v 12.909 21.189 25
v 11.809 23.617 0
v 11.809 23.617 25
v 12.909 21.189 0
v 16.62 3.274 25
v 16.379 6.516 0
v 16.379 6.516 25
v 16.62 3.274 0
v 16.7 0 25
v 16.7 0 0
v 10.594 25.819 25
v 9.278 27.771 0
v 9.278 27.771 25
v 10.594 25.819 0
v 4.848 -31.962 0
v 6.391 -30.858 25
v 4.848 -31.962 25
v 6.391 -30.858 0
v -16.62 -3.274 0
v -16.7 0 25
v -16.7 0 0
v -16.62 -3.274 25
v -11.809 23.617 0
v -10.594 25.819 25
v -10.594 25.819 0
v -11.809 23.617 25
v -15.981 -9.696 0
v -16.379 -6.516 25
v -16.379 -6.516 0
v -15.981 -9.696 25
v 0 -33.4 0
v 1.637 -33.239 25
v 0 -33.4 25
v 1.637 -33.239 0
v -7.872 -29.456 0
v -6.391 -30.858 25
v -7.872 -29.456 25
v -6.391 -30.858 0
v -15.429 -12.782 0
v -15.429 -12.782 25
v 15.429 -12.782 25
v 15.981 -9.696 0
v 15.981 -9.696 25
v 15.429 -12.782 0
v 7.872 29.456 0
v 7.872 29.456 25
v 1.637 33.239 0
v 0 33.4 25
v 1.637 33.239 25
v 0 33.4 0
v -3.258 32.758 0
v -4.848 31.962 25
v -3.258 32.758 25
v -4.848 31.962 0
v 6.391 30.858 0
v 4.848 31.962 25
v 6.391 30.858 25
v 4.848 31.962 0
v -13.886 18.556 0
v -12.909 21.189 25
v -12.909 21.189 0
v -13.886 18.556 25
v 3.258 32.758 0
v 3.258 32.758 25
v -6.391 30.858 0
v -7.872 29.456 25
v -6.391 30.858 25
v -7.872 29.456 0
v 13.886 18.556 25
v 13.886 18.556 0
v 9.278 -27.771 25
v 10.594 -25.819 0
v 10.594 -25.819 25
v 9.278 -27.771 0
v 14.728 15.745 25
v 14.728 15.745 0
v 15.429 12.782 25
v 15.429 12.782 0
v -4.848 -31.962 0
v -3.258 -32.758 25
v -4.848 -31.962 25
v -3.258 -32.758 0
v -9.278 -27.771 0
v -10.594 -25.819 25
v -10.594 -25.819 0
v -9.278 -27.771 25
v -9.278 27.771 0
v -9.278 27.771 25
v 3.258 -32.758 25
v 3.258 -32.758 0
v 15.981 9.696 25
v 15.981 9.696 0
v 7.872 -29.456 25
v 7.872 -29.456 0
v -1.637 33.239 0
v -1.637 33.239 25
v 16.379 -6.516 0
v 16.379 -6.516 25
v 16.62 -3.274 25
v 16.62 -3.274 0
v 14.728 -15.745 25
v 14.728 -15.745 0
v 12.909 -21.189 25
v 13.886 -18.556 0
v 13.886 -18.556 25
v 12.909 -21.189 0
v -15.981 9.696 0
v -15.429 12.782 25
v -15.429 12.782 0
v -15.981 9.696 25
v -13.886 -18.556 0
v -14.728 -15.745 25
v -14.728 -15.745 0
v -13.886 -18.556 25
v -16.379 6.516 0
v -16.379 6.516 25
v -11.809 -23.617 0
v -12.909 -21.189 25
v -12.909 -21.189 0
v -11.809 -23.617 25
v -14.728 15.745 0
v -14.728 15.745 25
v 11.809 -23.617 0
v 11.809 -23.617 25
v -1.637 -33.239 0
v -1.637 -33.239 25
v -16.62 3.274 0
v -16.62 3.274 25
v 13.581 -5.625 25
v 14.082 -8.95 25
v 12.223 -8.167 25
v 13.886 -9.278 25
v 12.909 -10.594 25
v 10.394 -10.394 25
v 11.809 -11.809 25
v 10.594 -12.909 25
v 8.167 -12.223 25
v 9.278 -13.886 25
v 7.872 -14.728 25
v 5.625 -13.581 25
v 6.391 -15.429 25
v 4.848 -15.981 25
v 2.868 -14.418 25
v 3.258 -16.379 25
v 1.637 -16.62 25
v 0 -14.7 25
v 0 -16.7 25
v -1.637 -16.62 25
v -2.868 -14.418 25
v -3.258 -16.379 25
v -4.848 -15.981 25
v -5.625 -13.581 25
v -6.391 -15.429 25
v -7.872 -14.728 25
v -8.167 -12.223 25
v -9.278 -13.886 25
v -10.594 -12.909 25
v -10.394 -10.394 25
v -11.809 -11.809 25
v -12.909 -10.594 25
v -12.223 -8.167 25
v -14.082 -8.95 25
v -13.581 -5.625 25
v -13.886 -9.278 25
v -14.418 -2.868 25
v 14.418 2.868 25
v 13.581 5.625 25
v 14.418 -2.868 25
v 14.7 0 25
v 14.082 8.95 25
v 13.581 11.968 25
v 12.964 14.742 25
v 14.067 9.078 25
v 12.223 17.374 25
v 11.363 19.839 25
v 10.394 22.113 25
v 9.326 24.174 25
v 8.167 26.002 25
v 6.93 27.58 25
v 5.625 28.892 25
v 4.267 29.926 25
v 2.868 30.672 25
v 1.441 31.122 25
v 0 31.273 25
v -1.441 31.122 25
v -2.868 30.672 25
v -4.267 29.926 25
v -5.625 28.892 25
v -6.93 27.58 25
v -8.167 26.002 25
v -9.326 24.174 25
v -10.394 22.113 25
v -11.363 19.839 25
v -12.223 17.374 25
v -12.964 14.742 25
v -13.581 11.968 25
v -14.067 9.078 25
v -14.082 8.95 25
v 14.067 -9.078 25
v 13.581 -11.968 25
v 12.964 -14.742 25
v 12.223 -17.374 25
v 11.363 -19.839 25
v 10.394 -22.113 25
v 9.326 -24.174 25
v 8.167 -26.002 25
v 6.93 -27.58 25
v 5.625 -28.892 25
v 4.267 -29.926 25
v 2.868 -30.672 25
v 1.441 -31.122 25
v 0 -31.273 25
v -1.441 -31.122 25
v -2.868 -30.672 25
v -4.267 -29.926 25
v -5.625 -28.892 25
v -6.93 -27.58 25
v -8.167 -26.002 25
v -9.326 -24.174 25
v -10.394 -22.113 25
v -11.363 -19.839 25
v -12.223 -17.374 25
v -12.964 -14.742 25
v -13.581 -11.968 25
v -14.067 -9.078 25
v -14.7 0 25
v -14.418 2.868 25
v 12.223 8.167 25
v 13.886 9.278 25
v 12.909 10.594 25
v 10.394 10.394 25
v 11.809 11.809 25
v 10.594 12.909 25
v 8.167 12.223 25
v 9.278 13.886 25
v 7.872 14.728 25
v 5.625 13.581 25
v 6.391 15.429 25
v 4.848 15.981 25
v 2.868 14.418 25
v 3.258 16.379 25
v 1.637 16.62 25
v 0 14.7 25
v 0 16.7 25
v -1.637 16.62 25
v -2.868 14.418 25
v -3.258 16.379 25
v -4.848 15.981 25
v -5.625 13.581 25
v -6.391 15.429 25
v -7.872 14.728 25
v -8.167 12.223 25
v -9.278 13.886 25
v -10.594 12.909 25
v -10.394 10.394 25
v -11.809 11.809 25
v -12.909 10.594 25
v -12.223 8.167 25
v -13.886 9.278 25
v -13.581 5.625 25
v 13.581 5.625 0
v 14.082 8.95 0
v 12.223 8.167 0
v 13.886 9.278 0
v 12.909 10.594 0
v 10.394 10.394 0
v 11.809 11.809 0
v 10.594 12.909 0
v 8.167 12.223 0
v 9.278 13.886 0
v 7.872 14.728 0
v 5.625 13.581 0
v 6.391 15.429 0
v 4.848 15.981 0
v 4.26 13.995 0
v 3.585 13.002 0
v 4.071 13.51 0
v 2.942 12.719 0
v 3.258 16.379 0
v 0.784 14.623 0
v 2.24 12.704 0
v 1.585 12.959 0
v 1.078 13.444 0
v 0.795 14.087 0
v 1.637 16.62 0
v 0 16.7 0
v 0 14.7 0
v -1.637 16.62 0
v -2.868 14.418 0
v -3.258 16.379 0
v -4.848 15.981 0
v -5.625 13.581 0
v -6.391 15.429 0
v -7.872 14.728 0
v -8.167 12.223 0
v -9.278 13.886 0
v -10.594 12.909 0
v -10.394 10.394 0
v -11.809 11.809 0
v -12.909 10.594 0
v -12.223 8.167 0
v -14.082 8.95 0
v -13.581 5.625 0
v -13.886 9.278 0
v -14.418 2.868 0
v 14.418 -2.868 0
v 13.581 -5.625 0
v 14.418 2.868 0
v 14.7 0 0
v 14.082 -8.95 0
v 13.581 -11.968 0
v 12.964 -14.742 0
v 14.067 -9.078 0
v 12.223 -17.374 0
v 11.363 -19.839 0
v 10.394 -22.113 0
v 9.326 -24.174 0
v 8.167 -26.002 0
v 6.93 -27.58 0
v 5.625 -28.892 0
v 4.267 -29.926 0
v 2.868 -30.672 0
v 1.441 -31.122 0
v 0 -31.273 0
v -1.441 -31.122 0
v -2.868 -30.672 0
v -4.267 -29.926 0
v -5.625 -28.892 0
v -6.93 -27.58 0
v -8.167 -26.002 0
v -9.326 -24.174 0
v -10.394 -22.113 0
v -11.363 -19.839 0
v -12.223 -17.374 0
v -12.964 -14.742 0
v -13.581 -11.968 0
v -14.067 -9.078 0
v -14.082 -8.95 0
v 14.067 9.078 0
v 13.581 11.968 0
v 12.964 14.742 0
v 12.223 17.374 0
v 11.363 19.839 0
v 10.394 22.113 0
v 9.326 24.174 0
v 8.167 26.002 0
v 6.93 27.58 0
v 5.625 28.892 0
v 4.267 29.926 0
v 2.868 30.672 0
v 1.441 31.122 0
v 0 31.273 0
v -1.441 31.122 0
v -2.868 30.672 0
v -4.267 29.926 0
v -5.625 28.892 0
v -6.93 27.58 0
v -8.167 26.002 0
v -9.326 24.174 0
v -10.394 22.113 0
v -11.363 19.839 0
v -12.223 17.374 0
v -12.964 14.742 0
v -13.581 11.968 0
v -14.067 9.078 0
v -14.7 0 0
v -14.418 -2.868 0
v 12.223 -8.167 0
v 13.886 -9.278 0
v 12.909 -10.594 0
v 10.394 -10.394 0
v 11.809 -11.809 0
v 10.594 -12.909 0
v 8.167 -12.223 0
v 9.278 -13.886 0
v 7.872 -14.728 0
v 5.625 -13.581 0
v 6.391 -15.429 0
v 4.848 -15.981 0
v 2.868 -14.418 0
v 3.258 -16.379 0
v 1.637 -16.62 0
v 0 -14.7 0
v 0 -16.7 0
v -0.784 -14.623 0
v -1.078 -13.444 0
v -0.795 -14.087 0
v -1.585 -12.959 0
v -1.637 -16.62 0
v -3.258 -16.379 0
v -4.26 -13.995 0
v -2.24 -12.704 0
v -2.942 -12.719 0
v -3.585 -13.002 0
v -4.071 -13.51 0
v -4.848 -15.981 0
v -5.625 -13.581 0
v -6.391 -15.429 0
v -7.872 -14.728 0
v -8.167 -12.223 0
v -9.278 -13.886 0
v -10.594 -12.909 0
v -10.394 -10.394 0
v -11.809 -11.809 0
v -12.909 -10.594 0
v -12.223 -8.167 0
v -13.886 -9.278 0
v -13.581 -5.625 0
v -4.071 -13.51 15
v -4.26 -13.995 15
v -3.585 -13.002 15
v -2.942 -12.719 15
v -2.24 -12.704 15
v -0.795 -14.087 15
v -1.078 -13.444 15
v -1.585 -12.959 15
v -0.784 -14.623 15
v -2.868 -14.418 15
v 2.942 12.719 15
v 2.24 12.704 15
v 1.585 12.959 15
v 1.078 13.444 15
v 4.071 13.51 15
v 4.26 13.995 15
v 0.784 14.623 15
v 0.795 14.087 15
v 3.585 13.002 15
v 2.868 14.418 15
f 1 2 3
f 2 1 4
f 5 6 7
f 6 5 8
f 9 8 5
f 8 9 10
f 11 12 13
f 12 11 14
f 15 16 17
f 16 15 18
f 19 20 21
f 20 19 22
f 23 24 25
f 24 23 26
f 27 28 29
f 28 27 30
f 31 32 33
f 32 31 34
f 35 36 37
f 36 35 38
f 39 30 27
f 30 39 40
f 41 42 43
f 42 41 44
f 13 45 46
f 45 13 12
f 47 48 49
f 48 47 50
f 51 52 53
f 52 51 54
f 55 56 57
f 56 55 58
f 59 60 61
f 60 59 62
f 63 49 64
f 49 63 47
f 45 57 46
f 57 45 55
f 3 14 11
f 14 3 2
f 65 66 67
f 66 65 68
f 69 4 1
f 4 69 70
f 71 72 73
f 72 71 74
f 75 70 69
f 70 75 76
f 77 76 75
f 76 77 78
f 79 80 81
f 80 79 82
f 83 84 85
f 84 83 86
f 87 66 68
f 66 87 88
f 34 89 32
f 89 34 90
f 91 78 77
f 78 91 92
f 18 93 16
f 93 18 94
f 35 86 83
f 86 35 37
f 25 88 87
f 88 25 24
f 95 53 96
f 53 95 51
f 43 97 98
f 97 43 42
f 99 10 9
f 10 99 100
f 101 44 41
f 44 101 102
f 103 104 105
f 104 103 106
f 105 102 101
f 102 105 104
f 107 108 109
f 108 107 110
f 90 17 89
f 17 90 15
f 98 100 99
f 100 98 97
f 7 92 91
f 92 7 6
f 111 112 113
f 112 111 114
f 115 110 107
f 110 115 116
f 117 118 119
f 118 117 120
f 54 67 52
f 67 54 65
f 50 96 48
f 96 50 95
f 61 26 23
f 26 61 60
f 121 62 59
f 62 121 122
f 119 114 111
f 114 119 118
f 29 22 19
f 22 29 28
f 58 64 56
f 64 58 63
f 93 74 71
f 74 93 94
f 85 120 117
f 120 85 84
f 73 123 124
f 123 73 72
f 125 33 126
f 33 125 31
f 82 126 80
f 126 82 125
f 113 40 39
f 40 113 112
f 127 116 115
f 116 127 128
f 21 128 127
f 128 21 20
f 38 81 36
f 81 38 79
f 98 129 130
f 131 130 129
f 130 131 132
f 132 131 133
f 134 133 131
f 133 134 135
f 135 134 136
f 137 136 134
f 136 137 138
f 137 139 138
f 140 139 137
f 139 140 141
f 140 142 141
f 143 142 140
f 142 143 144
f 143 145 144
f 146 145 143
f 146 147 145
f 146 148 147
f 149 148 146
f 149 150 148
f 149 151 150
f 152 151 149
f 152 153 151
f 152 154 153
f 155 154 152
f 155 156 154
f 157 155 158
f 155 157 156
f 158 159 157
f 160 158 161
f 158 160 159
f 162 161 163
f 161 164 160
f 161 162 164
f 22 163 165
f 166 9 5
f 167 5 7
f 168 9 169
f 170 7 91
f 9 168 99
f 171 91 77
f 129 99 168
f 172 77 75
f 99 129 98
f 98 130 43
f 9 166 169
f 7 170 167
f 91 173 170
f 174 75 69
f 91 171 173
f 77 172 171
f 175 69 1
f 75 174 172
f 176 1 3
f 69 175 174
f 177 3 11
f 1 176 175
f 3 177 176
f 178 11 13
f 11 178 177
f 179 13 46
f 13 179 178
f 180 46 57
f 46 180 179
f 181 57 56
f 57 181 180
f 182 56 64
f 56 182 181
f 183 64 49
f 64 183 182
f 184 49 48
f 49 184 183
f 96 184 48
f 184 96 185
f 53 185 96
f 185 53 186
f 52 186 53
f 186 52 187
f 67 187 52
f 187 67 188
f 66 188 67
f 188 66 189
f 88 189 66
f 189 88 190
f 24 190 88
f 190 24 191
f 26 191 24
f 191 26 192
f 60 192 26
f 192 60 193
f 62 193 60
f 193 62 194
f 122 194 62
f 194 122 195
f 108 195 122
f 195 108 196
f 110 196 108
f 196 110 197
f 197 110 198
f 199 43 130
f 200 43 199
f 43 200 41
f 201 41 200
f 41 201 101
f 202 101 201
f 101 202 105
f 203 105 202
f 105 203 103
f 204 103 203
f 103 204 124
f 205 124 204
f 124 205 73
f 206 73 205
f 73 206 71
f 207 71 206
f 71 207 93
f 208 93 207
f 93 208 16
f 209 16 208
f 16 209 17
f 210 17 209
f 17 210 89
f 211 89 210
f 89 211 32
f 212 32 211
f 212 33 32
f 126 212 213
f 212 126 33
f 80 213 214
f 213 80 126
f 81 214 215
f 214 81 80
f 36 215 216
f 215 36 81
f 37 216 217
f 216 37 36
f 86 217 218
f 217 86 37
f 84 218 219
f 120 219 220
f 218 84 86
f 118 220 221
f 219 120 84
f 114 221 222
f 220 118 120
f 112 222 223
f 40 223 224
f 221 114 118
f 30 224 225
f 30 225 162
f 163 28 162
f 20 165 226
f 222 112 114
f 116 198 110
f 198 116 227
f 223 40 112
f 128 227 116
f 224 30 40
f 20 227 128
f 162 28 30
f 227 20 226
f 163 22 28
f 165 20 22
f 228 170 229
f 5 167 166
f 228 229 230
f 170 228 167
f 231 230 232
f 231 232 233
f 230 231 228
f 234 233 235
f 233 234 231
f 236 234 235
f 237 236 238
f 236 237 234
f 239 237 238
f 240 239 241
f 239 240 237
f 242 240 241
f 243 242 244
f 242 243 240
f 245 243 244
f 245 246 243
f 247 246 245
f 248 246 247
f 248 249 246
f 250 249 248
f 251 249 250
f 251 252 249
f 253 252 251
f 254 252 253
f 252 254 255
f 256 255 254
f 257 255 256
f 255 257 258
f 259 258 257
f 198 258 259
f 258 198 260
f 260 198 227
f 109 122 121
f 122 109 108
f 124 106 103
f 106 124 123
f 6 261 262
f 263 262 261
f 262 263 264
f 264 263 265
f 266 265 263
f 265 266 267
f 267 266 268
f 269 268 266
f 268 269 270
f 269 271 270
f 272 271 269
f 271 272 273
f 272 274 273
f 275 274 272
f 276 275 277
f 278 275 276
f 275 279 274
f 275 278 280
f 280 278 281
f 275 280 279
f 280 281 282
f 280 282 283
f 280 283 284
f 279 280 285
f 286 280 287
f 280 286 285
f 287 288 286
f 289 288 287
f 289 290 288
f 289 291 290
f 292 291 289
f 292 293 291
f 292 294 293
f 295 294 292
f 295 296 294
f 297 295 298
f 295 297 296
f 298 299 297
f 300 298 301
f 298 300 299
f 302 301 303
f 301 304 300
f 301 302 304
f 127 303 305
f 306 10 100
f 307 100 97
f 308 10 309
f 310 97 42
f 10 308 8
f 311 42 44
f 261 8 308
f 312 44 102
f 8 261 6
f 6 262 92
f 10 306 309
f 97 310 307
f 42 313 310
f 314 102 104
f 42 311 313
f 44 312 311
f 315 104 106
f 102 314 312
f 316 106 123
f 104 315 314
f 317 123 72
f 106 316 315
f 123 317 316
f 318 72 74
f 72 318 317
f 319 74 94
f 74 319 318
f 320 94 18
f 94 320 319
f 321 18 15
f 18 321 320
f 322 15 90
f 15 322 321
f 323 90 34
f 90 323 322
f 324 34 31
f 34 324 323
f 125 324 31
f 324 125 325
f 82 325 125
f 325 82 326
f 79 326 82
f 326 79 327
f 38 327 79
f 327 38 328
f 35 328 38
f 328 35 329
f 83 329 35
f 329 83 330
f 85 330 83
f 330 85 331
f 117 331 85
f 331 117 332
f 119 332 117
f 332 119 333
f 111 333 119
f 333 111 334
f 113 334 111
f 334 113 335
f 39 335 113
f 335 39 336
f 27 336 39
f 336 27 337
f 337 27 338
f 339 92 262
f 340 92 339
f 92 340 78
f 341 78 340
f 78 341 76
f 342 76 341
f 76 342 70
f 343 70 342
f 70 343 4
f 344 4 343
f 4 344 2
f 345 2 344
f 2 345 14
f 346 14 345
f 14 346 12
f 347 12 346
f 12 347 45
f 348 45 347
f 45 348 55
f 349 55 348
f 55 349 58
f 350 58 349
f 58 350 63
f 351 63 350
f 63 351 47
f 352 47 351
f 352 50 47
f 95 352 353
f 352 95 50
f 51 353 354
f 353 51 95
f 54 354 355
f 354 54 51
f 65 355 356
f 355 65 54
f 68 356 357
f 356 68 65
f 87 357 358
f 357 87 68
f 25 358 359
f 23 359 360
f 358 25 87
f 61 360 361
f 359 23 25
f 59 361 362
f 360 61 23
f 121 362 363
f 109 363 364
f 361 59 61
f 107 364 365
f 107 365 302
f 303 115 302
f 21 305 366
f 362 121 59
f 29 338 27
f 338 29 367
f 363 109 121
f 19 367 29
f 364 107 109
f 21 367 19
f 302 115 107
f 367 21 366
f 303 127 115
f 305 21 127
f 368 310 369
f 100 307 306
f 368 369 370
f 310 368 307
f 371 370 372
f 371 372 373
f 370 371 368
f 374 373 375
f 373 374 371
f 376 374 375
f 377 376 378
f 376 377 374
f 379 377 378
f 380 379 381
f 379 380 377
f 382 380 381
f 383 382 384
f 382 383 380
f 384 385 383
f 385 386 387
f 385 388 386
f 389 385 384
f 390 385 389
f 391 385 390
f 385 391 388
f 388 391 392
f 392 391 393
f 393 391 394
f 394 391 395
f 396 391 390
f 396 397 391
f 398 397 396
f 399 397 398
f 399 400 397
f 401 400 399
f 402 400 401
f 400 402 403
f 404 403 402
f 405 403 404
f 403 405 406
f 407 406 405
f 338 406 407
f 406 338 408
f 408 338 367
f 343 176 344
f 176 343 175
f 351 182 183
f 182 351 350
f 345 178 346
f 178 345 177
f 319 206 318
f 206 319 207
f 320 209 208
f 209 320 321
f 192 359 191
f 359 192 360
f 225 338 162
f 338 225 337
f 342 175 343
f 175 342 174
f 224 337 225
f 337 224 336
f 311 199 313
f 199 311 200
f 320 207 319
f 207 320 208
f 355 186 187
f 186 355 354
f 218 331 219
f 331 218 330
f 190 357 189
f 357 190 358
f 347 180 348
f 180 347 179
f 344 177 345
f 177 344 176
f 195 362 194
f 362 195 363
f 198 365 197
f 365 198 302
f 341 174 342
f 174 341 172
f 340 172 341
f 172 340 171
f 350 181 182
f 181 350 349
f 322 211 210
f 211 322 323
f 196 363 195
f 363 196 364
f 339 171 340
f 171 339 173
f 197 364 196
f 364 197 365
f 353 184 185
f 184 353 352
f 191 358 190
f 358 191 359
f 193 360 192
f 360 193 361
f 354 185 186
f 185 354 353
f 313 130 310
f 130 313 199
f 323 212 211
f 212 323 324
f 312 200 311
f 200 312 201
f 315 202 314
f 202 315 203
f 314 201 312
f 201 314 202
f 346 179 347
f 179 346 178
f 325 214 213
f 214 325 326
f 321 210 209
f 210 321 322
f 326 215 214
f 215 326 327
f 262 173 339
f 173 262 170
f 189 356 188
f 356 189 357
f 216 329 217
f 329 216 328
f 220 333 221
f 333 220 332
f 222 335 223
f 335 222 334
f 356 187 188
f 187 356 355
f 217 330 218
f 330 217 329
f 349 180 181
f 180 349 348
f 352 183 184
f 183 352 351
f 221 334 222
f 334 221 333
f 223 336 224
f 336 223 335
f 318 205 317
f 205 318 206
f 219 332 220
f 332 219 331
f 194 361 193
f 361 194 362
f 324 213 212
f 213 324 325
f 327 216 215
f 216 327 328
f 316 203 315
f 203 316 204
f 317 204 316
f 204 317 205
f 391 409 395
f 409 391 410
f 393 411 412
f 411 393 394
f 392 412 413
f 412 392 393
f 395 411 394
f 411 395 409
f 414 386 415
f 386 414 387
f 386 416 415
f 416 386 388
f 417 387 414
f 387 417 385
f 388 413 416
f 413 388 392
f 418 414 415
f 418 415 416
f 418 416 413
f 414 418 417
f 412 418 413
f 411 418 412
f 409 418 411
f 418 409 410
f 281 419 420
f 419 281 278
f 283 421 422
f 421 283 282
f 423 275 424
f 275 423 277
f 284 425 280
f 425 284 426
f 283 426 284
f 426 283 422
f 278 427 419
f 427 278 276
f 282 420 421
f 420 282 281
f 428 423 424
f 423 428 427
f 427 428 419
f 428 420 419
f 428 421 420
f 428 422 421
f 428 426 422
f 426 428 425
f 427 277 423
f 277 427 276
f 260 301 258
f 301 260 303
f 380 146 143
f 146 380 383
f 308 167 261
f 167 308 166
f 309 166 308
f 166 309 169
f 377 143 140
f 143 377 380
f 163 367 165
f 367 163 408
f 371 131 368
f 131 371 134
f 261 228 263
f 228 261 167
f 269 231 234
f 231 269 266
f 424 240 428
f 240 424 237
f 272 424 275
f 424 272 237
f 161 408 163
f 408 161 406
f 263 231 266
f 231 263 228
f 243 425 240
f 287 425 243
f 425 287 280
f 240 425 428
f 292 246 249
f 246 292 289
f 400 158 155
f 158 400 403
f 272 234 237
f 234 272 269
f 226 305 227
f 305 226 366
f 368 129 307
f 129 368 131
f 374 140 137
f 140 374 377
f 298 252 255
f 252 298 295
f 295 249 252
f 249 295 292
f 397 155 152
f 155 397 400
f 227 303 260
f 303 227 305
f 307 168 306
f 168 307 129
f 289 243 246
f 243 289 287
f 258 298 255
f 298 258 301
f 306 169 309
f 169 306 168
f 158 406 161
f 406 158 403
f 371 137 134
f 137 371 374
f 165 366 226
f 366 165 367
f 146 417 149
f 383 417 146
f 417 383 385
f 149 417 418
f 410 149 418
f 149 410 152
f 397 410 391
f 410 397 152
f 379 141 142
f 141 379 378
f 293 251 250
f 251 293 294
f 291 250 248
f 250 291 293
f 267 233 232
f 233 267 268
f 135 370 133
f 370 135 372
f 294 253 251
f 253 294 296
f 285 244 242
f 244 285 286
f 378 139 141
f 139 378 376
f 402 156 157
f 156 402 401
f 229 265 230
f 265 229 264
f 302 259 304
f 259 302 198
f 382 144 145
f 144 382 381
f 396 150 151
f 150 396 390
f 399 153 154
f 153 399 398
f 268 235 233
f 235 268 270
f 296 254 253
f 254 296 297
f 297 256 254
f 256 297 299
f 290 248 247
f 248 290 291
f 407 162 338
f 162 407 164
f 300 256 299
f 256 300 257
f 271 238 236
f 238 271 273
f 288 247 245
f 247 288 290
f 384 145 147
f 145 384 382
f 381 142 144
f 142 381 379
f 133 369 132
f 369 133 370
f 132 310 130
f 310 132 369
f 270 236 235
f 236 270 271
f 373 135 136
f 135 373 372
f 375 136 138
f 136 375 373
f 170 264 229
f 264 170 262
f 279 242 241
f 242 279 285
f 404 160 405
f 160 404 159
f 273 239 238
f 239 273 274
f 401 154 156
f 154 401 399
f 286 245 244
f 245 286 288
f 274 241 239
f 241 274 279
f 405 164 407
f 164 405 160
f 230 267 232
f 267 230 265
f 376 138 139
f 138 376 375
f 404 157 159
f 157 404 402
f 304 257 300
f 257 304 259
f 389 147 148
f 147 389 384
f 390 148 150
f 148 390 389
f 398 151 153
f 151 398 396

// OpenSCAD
diameter = 29.4;
indent_diameter = 3.6;
thickness = 4;
height = 25;
indent = 15;
outer_diameter = diameter + thickness;
outer_thicknes = thickness;

module covert_mount() {
    union() {
        difference() {
            scale([1, 2, 1]) cylinder(h=height, d=outer_diameter, $fn=64);
            translate([0,0, -1])scale([1, outer_diameter*2/(outer_diameter-outer_thicknes/2), 1]) cylinder(h=height+2, d=outer_diameter-outer_thicknes, $fn=64);
        }
        difference() {
            cylinder(h=height, d=outer_diameter, $fn=64);
            difference() {
                translate([0,0, -1]) cylinder(h=height+2, d=diameter, $fn=32);
                rotate([0,0,80]) for (xx=[-1, 1]) translate([diameter/2 * xx, 0 , -1]) cylinder(h=indent+1, d=indent_diameter, $fn=16);
            }
        }
    }
}

//output:covert_mount:covert_mount();

//view
covert_mount();
